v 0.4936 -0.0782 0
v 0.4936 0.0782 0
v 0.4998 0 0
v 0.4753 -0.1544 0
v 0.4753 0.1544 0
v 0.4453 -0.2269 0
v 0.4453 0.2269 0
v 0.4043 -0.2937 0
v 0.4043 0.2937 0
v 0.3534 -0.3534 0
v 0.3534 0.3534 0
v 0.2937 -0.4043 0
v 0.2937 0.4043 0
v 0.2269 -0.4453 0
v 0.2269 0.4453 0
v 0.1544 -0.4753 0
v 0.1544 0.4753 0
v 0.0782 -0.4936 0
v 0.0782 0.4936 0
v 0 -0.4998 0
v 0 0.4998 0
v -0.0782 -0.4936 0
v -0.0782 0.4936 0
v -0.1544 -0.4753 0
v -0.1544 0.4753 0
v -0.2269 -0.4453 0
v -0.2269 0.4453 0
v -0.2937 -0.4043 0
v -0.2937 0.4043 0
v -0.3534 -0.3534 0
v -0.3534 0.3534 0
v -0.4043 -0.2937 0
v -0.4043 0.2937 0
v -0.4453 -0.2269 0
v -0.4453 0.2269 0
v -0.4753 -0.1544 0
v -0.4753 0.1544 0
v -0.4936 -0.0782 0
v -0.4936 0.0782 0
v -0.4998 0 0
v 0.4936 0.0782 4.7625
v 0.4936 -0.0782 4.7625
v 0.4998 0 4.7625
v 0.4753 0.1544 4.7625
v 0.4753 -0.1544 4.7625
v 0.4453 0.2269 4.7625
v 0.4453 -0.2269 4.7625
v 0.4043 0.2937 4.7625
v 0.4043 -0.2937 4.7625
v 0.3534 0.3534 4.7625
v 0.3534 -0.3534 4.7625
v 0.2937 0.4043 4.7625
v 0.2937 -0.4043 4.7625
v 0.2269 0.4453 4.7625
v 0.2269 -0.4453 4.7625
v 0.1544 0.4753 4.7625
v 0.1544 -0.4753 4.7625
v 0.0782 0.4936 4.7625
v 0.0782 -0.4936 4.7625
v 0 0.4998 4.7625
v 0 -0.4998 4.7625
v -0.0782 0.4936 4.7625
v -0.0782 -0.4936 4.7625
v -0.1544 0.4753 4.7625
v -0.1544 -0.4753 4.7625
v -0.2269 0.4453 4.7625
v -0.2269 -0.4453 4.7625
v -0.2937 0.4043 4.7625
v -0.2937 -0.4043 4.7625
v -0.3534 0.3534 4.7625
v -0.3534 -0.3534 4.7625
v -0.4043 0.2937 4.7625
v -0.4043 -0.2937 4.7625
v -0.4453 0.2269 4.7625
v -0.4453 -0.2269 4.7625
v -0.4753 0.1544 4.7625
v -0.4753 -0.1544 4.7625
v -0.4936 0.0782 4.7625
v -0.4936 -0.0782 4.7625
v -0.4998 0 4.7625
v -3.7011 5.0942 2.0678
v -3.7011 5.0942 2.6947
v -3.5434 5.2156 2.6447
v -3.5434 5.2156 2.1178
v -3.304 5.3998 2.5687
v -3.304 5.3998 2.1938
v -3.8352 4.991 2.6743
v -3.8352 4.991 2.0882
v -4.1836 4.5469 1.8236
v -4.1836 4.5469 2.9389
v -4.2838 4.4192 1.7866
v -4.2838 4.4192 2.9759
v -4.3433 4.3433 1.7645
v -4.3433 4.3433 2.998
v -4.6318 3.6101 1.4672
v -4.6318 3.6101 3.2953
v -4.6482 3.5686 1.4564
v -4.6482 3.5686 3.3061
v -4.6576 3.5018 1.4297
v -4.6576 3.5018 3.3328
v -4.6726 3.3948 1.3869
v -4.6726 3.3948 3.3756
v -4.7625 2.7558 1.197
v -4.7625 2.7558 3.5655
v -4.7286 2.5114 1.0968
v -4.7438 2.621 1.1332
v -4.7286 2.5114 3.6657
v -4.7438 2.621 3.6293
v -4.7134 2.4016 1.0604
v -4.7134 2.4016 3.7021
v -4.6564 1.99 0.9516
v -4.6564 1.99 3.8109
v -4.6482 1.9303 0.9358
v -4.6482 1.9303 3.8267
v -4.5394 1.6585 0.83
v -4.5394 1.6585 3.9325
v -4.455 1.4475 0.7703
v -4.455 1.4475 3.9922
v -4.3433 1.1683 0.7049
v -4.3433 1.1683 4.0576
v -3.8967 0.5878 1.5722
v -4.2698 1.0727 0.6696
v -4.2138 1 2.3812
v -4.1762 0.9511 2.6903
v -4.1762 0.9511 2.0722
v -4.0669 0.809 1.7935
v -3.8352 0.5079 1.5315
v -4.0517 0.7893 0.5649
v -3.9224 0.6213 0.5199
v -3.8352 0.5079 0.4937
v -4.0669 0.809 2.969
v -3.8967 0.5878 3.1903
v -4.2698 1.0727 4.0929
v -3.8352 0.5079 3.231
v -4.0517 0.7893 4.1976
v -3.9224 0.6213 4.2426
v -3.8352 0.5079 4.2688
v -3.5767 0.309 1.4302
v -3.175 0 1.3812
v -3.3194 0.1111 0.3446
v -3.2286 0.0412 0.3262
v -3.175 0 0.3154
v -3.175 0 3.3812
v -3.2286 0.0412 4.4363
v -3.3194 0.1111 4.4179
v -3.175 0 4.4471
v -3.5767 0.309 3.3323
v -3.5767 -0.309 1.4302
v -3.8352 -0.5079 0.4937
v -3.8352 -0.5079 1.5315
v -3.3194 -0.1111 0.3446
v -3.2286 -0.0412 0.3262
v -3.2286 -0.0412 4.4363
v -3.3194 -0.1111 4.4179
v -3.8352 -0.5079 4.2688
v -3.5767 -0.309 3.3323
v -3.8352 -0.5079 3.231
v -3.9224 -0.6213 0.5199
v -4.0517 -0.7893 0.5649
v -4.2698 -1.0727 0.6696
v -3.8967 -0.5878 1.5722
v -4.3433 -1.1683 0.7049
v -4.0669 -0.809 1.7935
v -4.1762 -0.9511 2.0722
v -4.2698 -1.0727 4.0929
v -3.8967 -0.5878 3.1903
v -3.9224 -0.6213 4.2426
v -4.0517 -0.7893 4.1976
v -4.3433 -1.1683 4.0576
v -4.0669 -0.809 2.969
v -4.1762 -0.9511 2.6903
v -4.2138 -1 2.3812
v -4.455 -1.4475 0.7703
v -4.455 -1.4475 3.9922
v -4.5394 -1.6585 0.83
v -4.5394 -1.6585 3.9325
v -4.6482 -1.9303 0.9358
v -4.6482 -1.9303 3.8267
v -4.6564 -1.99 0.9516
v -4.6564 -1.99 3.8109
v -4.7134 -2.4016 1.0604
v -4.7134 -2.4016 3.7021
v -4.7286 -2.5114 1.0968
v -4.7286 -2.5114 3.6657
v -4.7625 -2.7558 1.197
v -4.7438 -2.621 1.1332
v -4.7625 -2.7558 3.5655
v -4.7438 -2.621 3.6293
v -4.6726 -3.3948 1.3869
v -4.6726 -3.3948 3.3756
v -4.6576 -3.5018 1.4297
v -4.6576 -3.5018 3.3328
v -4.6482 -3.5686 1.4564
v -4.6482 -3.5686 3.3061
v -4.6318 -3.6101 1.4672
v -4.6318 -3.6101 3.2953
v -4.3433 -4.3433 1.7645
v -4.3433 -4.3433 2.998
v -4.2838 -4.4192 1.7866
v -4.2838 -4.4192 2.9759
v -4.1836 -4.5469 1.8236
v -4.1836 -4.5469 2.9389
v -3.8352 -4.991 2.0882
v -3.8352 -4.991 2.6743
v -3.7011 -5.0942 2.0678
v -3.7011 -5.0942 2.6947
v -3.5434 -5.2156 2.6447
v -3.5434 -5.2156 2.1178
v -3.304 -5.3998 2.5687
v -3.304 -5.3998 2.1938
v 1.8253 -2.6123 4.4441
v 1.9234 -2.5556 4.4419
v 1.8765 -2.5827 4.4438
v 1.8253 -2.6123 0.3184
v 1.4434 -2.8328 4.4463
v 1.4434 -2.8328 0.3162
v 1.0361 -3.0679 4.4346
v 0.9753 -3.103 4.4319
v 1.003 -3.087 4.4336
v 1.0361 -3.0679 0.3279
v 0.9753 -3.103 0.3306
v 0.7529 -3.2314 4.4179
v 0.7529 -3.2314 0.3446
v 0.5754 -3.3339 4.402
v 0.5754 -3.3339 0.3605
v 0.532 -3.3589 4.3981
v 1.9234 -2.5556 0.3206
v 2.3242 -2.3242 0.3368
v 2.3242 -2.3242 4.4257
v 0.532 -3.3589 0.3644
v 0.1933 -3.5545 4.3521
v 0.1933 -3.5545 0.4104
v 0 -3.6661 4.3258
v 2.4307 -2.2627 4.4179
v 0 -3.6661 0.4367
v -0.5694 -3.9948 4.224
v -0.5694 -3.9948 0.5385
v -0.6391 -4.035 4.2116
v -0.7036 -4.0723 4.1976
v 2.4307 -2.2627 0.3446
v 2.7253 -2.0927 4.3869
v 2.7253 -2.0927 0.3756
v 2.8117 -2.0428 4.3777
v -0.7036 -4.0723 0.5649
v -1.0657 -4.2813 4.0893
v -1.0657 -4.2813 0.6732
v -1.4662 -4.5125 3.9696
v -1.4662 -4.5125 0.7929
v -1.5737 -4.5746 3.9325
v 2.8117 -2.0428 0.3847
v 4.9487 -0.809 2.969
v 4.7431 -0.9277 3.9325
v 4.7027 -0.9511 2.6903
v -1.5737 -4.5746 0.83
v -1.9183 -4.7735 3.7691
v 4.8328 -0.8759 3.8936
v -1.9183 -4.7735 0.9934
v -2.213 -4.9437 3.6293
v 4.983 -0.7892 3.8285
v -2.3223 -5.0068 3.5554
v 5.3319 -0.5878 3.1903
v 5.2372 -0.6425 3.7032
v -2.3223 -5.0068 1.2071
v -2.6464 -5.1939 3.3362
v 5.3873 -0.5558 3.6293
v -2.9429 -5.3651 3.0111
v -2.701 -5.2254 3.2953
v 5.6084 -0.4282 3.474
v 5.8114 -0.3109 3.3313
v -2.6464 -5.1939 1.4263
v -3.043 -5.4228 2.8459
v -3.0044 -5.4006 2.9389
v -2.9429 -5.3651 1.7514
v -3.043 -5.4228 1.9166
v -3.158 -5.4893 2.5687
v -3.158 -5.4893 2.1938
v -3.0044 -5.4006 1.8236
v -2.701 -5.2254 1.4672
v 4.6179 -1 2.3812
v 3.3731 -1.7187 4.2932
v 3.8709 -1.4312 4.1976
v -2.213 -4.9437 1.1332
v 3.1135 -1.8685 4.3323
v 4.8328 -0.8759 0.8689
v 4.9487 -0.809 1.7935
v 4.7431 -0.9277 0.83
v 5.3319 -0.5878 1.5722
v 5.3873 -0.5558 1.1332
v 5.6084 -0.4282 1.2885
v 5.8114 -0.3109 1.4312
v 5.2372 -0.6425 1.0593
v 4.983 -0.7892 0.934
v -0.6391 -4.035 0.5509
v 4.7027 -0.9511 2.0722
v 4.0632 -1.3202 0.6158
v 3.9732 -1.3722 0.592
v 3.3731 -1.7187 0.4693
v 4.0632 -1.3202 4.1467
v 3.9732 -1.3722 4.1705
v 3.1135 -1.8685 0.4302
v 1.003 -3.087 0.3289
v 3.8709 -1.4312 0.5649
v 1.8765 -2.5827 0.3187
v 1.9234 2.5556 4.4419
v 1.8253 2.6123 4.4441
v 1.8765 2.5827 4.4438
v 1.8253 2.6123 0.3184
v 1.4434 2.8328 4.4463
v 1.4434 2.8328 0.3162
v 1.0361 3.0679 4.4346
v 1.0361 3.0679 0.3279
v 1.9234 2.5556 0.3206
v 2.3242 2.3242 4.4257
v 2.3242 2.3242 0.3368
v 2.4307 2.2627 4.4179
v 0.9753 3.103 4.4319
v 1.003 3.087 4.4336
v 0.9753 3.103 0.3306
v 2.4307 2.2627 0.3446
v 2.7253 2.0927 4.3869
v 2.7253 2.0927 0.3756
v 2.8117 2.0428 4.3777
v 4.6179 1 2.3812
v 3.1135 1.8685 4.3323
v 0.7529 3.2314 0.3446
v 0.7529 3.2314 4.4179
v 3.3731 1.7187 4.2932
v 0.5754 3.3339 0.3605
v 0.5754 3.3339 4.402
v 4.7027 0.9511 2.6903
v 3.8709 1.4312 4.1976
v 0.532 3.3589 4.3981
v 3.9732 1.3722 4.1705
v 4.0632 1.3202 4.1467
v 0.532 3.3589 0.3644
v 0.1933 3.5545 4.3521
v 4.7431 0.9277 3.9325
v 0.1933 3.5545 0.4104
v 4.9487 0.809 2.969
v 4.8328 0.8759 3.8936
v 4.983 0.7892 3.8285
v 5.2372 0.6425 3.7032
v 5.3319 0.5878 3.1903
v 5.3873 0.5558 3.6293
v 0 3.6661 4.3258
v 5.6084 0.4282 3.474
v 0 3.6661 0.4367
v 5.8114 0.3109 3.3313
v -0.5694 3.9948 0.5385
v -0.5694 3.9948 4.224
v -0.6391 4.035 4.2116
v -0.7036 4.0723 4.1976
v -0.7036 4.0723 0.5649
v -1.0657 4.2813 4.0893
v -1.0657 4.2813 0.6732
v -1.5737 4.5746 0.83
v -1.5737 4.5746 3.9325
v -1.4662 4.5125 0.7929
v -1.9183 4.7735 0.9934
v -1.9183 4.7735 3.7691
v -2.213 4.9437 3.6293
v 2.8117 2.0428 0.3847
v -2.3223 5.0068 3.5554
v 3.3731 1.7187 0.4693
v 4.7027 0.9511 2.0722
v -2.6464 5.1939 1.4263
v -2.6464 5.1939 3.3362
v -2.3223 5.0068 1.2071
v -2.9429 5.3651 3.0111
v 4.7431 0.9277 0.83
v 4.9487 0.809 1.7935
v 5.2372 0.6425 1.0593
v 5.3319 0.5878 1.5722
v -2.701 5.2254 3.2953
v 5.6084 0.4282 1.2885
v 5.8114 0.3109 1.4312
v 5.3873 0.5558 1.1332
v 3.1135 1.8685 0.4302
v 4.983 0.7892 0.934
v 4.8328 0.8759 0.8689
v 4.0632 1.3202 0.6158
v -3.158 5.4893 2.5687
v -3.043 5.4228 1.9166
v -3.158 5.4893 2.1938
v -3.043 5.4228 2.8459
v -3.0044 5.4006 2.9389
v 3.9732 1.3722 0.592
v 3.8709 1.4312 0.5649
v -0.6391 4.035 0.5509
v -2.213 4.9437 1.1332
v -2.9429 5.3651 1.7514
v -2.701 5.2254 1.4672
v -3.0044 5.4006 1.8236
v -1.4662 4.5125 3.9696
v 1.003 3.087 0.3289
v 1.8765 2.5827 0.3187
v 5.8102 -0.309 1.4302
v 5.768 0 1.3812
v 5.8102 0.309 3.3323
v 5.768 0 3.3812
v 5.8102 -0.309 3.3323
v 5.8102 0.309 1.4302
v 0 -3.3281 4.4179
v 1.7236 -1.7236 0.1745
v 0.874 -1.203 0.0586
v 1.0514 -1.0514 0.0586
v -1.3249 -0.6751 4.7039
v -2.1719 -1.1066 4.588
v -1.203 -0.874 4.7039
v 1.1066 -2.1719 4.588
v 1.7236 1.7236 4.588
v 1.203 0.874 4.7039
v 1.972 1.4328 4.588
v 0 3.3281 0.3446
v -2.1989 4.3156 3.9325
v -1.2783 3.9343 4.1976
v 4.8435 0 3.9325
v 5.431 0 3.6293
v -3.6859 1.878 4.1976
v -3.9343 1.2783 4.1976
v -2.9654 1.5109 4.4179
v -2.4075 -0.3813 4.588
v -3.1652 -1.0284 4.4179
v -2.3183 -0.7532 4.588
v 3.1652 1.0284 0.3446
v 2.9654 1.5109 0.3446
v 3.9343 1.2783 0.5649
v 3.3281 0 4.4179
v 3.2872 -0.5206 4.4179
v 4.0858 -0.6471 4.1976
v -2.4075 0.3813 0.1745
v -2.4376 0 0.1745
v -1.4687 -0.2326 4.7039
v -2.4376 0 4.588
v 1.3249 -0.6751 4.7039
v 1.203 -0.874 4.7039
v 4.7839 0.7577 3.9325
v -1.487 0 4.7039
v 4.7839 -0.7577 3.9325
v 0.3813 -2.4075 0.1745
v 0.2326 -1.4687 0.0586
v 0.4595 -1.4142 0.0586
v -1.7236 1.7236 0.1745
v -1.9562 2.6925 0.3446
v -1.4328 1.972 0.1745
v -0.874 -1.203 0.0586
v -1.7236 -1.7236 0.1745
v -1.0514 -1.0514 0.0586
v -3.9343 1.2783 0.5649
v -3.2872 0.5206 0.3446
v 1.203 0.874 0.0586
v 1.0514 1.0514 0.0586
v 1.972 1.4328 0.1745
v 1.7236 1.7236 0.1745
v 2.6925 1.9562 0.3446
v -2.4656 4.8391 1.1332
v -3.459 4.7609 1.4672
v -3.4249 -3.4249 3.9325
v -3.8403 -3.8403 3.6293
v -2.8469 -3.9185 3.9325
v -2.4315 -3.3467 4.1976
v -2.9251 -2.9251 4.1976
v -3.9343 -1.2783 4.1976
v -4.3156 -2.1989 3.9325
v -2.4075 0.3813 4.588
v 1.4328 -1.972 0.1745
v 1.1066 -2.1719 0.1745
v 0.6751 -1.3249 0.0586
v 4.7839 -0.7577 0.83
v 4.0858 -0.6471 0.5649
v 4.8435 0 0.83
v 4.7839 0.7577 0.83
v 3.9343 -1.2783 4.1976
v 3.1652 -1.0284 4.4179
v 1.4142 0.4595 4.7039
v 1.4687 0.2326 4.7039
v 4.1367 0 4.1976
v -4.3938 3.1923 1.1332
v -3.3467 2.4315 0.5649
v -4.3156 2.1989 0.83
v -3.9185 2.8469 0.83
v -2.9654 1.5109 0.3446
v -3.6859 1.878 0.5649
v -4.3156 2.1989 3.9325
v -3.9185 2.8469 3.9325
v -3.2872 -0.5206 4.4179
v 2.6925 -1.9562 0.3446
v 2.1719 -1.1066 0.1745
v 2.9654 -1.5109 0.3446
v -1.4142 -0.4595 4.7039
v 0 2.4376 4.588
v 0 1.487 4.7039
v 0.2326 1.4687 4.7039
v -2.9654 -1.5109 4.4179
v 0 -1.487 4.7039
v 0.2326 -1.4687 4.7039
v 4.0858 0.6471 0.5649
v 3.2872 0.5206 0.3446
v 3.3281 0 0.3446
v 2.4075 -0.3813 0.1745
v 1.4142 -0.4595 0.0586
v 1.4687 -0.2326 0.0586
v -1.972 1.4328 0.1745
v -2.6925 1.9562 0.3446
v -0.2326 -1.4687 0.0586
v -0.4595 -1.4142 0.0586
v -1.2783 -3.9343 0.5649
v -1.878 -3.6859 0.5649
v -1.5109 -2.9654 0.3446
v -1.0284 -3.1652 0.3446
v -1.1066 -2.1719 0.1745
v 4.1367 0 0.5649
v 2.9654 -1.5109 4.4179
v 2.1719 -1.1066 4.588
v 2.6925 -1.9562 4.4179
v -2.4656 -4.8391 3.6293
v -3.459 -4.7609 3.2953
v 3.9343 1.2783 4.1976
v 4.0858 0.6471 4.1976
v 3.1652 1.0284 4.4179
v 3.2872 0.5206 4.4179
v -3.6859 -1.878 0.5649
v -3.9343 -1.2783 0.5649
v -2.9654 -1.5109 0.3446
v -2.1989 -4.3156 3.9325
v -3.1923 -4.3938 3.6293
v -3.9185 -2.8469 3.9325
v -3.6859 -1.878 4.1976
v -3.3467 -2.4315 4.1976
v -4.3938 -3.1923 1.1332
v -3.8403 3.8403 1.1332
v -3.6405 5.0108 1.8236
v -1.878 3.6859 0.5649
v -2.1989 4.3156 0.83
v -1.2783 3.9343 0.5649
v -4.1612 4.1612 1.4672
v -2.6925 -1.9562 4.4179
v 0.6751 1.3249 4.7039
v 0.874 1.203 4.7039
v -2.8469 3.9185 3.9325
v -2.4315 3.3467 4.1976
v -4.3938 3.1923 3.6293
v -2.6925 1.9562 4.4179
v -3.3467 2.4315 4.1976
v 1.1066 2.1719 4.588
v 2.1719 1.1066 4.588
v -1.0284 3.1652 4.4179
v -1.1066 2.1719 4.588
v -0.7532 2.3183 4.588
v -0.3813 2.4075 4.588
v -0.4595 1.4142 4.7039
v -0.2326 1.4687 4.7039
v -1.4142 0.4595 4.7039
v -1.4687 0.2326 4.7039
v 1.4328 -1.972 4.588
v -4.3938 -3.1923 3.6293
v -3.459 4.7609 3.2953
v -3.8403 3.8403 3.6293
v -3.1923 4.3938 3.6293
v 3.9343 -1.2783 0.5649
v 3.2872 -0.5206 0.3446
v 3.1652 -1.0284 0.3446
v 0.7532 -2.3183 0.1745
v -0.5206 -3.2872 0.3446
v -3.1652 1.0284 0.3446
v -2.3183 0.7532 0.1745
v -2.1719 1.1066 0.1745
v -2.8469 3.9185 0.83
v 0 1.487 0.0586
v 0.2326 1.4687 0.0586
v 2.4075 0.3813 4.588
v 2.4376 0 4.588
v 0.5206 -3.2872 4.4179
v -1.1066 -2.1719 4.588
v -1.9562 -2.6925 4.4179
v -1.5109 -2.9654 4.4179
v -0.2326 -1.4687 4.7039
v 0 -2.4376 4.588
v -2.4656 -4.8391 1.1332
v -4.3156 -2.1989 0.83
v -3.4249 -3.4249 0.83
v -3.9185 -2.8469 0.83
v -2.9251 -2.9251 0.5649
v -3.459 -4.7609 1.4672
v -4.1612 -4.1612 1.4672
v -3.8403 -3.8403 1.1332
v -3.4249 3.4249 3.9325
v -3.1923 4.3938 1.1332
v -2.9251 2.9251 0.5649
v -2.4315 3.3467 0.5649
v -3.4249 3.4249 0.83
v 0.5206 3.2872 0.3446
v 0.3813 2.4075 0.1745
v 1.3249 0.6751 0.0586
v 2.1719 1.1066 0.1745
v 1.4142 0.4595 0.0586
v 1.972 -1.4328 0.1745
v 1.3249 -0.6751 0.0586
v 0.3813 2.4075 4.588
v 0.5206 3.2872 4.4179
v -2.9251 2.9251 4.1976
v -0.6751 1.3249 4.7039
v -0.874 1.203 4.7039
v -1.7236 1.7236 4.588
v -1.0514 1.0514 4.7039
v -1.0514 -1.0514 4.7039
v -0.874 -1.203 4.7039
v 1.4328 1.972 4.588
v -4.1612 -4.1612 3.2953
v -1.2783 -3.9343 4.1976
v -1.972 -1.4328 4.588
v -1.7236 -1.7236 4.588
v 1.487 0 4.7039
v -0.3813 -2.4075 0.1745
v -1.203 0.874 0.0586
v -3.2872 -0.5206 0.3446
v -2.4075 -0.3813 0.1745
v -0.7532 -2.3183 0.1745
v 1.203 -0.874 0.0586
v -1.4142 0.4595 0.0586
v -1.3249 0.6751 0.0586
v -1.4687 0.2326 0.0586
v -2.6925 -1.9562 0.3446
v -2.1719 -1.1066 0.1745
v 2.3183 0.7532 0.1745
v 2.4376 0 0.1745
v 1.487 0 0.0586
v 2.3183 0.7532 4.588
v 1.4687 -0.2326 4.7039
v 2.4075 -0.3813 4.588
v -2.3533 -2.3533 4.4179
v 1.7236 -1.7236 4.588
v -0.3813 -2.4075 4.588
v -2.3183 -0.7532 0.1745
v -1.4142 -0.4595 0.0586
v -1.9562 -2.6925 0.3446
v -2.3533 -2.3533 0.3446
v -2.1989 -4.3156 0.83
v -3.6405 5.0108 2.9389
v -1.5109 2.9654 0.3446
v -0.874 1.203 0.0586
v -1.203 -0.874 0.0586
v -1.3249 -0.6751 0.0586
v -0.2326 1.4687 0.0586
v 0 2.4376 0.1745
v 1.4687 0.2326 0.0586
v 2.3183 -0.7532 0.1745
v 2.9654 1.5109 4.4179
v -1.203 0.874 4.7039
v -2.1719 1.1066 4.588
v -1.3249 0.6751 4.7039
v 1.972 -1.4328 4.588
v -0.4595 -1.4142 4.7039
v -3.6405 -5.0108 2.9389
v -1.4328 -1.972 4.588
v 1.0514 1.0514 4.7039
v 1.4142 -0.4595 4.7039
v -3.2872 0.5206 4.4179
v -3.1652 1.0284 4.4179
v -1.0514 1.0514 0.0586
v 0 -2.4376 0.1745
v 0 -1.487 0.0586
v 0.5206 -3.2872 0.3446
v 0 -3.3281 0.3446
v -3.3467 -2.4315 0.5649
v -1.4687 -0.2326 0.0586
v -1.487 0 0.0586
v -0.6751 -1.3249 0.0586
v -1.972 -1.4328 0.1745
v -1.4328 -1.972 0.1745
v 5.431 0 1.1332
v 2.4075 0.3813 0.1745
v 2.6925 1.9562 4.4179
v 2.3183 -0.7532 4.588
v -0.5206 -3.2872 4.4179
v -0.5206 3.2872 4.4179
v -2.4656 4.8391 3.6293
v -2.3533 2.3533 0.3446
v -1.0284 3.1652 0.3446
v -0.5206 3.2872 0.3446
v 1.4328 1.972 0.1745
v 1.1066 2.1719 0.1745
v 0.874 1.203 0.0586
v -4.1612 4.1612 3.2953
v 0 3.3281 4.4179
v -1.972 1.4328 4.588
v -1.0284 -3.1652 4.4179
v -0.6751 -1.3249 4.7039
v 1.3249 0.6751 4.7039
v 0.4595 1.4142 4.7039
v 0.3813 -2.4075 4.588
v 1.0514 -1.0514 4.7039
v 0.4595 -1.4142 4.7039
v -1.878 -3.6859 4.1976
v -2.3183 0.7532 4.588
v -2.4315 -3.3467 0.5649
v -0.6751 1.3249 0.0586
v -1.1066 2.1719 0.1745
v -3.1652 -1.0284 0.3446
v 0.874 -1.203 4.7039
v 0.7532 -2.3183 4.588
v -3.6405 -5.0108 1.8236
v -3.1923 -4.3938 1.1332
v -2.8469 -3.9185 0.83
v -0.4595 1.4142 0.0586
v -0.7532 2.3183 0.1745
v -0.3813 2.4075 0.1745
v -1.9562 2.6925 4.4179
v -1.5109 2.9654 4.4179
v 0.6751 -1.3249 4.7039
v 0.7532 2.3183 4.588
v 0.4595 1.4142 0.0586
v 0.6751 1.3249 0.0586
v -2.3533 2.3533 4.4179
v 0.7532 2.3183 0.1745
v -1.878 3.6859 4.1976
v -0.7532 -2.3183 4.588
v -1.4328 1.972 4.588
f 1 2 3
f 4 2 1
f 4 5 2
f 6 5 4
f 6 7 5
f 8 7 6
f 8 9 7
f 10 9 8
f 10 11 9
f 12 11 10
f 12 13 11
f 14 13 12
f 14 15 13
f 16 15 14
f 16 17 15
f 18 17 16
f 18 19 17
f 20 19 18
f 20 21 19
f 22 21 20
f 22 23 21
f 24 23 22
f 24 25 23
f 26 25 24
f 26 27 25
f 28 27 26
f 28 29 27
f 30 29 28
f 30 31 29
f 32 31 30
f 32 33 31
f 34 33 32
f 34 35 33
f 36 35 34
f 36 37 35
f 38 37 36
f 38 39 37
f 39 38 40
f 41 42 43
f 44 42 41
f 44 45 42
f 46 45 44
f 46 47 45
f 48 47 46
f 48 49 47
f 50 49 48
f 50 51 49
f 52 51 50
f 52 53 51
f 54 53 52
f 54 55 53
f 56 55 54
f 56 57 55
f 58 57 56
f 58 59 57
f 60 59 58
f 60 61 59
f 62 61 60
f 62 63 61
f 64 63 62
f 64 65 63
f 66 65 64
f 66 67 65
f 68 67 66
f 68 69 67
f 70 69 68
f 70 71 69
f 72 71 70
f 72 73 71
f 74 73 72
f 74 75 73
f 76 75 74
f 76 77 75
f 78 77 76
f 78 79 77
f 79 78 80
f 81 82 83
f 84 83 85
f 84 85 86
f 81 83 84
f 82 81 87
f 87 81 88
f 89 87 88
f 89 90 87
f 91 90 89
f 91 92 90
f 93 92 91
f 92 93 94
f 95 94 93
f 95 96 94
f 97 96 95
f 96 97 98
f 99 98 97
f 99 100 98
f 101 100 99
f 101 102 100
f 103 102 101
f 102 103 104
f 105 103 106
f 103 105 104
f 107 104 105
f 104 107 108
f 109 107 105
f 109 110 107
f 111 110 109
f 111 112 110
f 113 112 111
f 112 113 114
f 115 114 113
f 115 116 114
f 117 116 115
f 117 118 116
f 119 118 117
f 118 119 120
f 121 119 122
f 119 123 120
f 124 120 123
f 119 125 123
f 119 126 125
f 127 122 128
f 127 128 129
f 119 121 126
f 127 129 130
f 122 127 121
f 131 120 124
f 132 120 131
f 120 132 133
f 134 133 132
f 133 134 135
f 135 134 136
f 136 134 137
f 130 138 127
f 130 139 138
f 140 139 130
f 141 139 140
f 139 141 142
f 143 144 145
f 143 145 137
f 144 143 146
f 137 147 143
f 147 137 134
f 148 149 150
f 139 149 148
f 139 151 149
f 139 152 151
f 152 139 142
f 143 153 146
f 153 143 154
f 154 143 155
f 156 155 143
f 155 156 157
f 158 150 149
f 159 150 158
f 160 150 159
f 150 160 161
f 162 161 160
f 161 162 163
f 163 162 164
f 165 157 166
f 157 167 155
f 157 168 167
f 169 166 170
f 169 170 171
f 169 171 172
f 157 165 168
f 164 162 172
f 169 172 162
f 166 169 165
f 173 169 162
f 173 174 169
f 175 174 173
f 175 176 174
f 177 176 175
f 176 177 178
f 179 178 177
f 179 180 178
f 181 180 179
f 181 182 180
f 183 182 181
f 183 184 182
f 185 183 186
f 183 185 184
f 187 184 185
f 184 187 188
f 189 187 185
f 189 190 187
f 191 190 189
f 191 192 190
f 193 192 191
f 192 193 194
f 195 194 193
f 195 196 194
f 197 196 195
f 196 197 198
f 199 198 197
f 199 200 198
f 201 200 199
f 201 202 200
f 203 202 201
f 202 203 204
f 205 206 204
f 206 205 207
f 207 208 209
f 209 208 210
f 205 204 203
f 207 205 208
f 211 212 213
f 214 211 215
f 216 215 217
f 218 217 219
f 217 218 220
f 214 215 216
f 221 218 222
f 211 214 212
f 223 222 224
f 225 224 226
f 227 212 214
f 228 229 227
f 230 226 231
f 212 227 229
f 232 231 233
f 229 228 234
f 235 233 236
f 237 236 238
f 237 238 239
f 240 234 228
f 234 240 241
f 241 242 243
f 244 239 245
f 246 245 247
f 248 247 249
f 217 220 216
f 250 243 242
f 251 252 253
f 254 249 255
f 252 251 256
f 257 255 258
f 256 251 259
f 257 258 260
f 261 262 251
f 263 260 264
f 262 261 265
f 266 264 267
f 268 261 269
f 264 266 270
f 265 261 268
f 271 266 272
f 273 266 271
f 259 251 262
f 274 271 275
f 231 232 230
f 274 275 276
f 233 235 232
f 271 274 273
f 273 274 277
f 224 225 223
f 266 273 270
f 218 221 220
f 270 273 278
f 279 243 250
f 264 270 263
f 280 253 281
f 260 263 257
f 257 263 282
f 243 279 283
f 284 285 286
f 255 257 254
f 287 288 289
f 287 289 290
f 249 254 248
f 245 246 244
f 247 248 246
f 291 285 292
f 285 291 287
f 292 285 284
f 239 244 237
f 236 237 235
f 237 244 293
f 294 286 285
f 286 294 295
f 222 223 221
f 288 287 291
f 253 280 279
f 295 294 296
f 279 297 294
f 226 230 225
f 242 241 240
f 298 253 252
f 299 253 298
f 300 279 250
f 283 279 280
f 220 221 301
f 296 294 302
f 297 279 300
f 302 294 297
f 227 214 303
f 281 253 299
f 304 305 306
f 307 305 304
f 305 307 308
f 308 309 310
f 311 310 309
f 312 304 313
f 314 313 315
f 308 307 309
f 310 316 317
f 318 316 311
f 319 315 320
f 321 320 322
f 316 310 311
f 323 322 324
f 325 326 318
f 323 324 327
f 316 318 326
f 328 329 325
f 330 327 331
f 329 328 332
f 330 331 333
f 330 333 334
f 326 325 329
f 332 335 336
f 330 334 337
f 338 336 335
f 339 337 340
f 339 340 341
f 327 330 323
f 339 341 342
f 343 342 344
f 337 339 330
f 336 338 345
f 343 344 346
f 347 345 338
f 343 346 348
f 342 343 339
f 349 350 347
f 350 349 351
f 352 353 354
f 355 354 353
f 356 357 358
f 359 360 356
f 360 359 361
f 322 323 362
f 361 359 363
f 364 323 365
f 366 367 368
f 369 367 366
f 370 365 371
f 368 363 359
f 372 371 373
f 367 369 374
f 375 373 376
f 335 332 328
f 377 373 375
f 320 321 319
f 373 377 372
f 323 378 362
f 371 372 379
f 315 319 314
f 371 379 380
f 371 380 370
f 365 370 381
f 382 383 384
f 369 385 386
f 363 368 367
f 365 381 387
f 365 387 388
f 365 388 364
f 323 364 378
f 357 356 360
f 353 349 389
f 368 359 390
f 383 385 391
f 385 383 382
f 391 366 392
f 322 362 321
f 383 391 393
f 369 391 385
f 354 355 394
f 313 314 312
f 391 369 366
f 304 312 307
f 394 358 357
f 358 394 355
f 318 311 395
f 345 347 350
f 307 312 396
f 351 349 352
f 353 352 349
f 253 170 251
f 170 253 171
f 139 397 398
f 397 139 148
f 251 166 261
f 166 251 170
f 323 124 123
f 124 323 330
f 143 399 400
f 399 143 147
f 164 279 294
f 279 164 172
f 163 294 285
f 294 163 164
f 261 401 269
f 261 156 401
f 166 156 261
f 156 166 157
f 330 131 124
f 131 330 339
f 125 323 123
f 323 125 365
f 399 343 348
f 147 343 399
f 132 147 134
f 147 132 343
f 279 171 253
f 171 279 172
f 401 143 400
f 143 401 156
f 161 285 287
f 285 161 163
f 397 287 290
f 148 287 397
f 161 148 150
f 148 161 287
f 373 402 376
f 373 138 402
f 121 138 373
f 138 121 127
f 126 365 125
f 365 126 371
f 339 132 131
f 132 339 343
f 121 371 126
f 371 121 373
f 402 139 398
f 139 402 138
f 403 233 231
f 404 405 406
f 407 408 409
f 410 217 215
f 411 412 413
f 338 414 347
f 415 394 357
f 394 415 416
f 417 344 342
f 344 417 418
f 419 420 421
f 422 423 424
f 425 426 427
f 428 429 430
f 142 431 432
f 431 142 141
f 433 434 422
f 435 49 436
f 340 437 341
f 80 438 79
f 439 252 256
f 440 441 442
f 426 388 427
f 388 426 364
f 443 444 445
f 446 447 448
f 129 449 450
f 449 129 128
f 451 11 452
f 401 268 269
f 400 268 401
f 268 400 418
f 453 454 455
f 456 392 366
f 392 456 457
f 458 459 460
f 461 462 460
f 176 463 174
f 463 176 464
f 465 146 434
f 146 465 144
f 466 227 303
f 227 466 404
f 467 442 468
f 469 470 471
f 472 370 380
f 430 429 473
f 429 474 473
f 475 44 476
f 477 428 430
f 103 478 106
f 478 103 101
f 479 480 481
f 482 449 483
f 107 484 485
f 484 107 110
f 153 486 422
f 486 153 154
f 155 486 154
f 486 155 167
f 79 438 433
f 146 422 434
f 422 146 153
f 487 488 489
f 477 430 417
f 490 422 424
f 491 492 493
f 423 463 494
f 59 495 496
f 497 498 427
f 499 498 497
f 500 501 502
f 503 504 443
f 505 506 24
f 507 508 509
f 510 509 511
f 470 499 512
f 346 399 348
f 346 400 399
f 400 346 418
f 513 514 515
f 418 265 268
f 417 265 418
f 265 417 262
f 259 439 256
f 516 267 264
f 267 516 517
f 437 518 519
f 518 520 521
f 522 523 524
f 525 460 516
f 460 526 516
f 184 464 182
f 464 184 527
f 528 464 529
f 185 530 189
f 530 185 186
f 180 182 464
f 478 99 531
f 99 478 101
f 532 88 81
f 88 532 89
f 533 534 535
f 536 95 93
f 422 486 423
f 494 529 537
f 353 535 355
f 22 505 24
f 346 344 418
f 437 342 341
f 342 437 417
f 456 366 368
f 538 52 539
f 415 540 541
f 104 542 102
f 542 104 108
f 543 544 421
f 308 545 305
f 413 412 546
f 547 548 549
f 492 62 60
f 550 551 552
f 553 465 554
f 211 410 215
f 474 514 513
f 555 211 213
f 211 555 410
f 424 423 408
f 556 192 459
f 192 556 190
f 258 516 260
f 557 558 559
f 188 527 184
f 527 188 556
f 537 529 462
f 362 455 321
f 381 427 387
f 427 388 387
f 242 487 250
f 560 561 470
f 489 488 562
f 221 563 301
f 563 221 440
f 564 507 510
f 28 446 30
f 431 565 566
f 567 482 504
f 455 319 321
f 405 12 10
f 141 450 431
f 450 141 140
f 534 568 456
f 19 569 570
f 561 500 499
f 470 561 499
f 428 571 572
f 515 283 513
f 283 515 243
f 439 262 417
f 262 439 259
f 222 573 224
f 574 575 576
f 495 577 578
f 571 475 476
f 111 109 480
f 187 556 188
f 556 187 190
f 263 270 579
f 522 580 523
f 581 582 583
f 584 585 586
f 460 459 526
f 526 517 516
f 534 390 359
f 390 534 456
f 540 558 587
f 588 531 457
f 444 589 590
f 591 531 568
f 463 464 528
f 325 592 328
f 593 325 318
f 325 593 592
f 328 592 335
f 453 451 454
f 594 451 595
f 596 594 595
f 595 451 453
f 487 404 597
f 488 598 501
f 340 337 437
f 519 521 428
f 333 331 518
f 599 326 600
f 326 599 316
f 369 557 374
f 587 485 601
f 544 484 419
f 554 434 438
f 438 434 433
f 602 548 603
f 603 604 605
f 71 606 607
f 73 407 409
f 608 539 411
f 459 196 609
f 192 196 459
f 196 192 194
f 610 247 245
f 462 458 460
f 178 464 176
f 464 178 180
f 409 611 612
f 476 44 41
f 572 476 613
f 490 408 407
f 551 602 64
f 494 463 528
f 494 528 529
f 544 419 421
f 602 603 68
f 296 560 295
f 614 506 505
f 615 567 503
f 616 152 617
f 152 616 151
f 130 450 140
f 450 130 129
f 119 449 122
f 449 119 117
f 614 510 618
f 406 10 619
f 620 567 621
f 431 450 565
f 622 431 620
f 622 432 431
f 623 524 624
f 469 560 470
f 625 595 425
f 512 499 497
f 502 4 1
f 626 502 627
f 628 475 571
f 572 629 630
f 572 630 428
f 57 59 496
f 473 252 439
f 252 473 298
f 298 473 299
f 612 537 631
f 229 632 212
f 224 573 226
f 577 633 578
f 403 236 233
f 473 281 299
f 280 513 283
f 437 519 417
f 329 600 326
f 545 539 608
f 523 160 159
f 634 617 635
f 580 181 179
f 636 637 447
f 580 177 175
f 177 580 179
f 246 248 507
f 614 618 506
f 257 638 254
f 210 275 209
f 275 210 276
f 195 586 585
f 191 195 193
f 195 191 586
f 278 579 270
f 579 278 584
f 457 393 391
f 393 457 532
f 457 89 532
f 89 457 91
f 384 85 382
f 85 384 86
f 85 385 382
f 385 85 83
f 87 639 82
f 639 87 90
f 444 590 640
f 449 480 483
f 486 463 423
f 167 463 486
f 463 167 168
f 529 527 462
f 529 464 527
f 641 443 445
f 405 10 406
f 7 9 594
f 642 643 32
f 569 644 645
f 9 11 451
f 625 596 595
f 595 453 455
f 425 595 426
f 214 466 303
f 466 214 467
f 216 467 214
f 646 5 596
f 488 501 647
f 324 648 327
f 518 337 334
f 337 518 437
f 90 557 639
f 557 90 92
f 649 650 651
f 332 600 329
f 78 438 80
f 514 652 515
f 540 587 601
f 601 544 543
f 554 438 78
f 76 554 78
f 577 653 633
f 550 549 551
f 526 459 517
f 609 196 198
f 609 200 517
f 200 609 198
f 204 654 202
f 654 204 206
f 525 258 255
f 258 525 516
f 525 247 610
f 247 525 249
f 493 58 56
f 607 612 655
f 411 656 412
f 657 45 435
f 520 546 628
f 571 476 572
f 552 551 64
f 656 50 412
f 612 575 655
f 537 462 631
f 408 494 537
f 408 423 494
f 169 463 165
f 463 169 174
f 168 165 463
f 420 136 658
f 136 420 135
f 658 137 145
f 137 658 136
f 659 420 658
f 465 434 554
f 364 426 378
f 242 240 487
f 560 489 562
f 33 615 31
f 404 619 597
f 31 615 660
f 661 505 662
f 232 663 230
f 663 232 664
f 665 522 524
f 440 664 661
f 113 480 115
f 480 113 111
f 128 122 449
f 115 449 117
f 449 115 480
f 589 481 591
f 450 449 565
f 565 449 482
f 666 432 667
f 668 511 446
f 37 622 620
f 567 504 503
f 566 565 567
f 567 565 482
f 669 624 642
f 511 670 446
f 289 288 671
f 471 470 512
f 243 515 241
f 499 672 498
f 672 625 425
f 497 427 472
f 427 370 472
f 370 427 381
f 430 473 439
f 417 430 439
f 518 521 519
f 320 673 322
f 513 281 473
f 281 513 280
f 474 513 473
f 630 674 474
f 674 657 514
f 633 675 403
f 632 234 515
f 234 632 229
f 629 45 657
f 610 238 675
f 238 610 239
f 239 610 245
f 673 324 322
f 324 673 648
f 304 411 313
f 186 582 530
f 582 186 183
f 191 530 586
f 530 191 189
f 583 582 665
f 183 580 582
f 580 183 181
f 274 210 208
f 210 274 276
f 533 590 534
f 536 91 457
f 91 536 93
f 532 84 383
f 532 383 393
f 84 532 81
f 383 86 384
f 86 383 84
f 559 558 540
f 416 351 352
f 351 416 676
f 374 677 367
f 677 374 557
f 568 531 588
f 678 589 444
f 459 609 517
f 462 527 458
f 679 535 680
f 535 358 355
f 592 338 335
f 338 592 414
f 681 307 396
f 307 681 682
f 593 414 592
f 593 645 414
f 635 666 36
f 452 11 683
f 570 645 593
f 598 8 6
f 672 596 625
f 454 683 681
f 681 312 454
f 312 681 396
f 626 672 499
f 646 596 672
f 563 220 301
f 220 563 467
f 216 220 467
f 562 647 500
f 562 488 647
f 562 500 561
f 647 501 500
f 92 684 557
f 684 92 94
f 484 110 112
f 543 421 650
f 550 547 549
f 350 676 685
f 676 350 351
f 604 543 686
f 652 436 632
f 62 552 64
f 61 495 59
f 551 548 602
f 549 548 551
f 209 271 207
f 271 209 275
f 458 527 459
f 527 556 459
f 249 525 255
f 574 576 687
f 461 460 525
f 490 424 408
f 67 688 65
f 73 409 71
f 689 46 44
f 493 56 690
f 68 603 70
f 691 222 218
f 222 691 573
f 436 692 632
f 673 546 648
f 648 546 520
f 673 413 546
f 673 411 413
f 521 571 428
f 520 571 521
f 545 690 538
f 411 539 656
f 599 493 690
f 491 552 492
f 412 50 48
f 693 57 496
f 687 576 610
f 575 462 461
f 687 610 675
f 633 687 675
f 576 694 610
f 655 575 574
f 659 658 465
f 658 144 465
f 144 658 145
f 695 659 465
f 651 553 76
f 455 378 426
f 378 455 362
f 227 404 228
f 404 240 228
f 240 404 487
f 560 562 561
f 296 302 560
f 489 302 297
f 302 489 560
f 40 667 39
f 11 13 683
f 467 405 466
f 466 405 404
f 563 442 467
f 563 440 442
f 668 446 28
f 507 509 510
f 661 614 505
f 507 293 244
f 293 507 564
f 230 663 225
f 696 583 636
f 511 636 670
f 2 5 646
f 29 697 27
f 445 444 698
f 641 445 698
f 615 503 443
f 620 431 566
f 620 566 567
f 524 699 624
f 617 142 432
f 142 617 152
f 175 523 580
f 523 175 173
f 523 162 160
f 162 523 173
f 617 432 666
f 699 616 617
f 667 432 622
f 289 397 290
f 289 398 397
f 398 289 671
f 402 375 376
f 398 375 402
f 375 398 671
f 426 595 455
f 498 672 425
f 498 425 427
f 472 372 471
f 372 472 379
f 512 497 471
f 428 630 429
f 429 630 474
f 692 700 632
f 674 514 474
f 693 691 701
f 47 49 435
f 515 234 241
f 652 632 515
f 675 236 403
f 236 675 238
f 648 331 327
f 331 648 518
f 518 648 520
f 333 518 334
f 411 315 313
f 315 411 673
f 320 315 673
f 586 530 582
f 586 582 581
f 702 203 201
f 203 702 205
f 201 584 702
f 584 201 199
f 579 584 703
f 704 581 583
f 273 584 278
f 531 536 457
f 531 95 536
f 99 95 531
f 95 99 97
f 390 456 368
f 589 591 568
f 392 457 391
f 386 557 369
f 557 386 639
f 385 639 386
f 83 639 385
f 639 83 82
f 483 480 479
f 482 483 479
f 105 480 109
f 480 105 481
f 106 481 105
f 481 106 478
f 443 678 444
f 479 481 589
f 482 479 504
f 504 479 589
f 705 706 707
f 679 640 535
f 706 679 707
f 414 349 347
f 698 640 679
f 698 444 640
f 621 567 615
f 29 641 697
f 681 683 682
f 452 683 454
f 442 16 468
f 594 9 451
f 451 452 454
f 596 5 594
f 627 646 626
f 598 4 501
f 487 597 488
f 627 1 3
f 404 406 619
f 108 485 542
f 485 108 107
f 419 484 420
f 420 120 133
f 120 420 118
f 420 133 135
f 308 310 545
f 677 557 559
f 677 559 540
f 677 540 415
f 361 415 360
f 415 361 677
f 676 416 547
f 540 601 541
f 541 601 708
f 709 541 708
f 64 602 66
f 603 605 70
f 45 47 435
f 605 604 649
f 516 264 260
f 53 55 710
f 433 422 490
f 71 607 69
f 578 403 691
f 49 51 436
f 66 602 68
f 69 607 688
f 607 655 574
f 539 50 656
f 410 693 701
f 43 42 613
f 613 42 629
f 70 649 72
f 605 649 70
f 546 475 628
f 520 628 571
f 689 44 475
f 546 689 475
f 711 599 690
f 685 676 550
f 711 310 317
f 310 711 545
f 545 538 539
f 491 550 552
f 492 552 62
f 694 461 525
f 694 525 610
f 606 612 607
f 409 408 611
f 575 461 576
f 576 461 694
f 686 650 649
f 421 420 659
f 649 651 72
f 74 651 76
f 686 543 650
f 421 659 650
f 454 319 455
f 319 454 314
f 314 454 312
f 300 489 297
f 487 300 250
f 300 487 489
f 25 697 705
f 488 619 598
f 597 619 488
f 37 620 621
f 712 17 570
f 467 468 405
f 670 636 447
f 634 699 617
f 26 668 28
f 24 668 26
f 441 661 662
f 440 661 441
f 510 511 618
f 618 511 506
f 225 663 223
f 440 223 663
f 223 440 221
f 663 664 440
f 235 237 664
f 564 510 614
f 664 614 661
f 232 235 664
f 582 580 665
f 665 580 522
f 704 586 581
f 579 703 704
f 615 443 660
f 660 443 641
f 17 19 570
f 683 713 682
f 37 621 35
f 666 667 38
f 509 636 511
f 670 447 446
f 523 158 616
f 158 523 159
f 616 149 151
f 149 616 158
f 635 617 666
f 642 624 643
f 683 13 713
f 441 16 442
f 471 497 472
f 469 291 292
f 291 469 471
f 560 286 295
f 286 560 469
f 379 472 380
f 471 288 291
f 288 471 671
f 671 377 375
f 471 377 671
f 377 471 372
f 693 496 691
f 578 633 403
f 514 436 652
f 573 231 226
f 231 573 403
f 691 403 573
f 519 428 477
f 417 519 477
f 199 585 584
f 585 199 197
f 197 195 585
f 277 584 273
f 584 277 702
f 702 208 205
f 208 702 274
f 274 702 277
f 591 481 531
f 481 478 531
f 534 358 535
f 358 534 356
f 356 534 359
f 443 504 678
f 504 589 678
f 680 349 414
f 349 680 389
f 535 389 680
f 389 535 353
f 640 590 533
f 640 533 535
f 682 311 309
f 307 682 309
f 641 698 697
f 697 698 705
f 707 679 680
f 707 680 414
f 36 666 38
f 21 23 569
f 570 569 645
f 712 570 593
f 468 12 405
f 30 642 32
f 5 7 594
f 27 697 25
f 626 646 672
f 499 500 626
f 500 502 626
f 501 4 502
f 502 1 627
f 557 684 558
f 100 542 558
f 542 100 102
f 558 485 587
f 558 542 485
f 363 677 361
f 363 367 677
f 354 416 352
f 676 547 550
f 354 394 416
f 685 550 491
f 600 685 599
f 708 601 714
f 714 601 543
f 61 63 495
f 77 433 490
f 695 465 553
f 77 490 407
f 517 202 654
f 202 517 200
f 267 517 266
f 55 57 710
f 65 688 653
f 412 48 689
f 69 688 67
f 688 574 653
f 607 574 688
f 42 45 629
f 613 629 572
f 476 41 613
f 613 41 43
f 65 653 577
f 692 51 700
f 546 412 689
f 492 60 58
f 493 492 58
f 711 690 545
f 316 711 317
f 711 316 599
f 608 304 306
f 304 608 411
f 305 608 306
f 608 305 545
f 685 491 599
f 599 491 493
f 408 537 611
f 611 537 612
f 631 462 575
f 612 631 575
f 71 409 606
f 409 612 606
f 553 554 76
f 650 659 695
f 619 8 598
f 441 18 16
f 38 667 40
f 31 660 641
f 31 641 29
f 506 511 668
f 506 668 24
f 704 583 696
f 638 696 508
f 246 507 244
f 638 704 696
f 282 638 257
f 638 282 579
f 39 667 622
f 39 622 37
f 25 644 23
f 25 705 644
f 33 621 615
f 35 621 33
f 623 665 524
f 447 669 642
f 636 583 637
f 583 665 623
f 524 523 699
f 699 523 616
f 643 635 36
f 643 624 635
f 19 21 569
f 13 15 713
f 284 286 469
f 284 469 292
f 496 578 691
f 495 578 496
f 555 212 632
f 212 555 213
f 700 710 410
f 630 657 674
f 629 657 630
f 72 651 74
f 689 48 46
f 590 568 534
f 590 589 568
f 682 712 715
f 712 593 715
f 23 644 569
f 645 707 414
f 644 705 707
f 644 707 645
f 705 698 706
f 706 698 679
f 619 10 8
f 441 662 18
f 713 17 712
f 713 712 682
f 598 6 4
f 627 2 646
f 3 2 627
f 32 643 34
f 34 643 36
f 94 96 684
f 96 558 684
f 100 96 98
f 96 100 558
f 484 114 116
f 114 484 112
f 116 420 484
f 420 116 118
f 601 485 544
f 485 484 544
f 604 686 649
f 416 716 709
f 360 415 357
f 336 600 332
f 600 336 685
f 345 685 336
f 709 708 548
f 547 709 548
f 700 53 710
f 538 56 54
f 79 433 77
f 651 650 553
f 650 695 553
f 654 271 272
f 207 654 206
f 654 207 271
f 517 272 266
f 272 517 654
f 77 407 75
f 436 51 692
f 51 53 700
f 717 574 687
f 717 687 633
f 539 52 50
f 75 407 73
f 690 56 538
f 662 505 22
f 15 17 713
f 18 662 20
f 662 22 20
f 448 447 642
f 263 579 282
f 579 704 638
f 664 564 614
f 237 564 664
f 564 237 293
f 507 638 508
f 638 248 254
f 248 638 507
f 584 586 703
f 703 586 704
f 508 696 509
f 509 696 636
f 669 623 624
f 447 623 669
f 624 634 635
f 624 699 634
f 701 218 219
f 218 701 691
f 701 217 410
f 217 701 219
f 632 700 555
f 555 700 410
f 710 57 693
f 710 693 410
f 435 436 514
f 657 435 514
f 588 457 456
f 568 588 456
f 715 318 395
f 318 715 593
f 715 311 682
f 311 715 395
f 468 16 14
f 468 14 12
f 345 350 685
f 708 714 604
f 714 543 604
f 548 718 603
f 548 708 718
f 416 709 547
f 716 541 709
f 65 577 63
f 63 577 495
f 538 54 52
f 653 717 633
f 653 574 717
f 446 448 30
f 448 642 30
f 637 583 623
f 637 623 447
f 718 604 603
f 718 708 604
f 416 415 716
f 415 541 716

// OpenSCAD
/* [Size of bead] */
//other shapes will be inscribed in a circle with that diameter
diameter_of_bead = .5;
height_of_bead = .1875;
/*[the hole in the bead]*/
diameter_of_hole = .0625;
axis_hole_is_on = 2;//[1:"z",2:"x",3:"y",4:"no hole"]
/*[advanced features]*/
//only mess with if you dare ^_^
ignore_error_messages = 2;//[1:true,0:false]

bead_shape = 9; //[0: circle, 1: 5 point star, 2: 6 point star, 3: triangle, 4: square, 5: pentagon, 6: hexagon, 8: octogon, 9: heart, 10: android, 11: (also not ready yet) apple]
resoultion = 40;//[5:100]
rounded_center =1;//[1:true,0:false]
//won't be implemented (yet...)
number_of_Colors = 1;


/* [Unit adjustment] */
//Basically are you using american units or real units
units_entered = 25.4;//[1:mm, 10:cm, 1000:meter, 25.4:inch, 304.8:foot]

//default is mm for most printers
desired_units_for_output = 1;//[1:mm, .1:cm, 0.001:meter, 0.0393701:inch, 0.00328084:foot]
//CUSTOMIZER VARIABLES END

unit_conversion_factor = units_entered*desired_units_for_output;

module base_shape (type_of_shape = 0){
	linear_extrude(height_of_bead*unit_conversion_factor){
		if(type_of_shape == 0){
			//circle
			circle(diameter_of_bead*unit_conversion_factor/2,$fn=resoultion);
		}
		else if(type_of_shape ==1){
			//5 point star
			rotate([0,0,-90]){
				polygon([[0,.5],[.476,.155],[.294,-.405],[-.294,-.405],[-.476,.155]]*diameter_of_bead*unit_conversion_factor,[[0,2,4,1,3]]);
				polygon([[.113,.156],[.182,-.059],[0,-.192],[-.182,-.059],[-.113,.156]]*diameter_of_bead*unit_conversion_factor,[[0,1,2,3,4]]);
			}
		}
		else if(type_of_shape ==2){
			//6 point star
			circle(diameter_of_bead*unit_conversion_factor/2,$fn=3);
			rotate([0,0,180]){
				circle(diameter_of_bead*unit_conversion_factor/2,$fn=3);
			}
		}
		else if(type_of_shape ==3){
			//triangle
			circle(diameter_of_bead*unit_conversion_factor/2,$fn=3);
		}
		else if(type_of_shape ==4){
			//square
			circle(diameter_of_bead*unit_conversion_factor/2,$fn=4);
		}
		else if(type_of_shape ==5){
			//pentagon
			circle(diameter_of_bead*unit_conversion_factor/2,$fn=5);
		}
		else if(type_of_shape ==6){
			//hexagon
			circle(diameter_of_bead*unit_conversion_factor/2,$fn=6);
		}
		else if(type_of_shape ==8){
			//octogon
				circle(diameter_of_bead*unit_conversion_factor/2,$fn=8);
		}
		/*else if(true){
			text("invalid shape of bead");
		}*/
		else if(type_of_shape == 9){
			rotate([0,0,90]){
				scale([diameter_of_bead*unit_conversion_factor,diameter_of_bead*unit_conversion_factor,0]){
					polygon([[.433,.25],[0,-.5],[-.433,.25],[-.393,.302],[-.342,.342],[-.281,.366],[-.217,.375],[-.152,.366],[-.092,.342],[-.04,.302],[0,.25],[.04,.302],[.092,.342],[.152,.366],[.217,.375],[.281,.366],[.342,.342],[.393,.302]]);
				}
			}
		}
		else if(type_of_shape ==10){
			//android
			scale([diameter_of_bead*unit_conversion_factor,diameter_of_bead*unit_conversion_factor,0]){
				translate([.25,0,0]){
					//head
					circle(.25,$fn = resoultion);
				}
				//body
				square(.5,center=true);
				translate([0,.25+.0312,0]){
					//left arm
					polygon(points=[[-.125,-.03125],[-.125,.03125],[.125,.03125],[.125,-.03125]]);
					translate([.125,0,0]){
						circle(.03125,$fn = resoultion);
					}
					translate([-.125,0,0]){
						circle(.03125,$fn = resoultion);
					}
				}
				translate([0,-.25-.0312,0]){
					//right arm
					polygon(points=[[-.125,-.03125],[-.125,.03125],[.125,.03125],[.125,-.03125]]);
					translate([.125,0,0]){
						circle(.03125,$fn = resoultion);
					}
					translate([-.125,0,0]){
						circle(.03125,$fn = resoultion);
					}
				}
				translate([-.25,.125,0]){
					//left leg
					polygon(points=[[-.125,-.0625],[-.125,.0625],[.125,.0625],[.125,-.0625]]);
					translate([-.125,0,0]){
						circle(.0625,$fn = resoultion);
					}
				}
				translate([-.25,-.125,0]){
					//right leg
					polygon(points=[[-.125,-.0625],[-.125,.0625],[.125,.0625],[.125,-.0625]]);
					translate([-.125,0,0]){
						circle(.0625,$fn = resoultion);
					}
				}
			}
			
		}
		else if(type_of_shape ==11){
			
		}


	}
}
module holes_to_be_cut(){	
	translate([0,0,-.1*unit_conversion_factor]){
		linear_extrude((height_of_bead+diameter_of_bead+1)*unit_conversion_factor,center=true)
				circle([diameter_of_hole*unit_conversion_factor,diameter_of_hole*unit_conversion_factor],$fn=resoultion/2);
	}
}
	
module round_bead(){
	translate([0,0,height_of_bead*unit_conversion_factor/2]){
		resize(newsize=[diameter_of_bead*unit_conversion_factor,diameter_of_bead*unit_conversion_factor,height_of_bead*unit_conversion_factor],center=true){
				sphere(diameter_of_bead*unit_conversion_factor,$fn=resoultion);
		}
	}
}
//user error message, aka warning you broke it

intersection(){
	difference(){
		base_shape(type_of_shape =bead_shape);
		if(axis_hole_is_on == 1){
			rotate([0,0,0]){
				holes_to_be_cut();
			}
		}
		else if(axis_hole_is_on == 2){
			translate([0,0,height_of_bead*unit_conversion_factor/2]){
				rotate([0,90,0]){
					holes_to_be_cut();
				}
			}
		}
		else if(axis_hole_is_on==3){
			translate([0,0,height_of_bead*unit_conversion_factor/2]){
				rotate([90,0,0]){
					holes_to_be_cut();
				}
			}
		}
	}
	
	if(rounded_center==1){
		round_bead();
	}
}
